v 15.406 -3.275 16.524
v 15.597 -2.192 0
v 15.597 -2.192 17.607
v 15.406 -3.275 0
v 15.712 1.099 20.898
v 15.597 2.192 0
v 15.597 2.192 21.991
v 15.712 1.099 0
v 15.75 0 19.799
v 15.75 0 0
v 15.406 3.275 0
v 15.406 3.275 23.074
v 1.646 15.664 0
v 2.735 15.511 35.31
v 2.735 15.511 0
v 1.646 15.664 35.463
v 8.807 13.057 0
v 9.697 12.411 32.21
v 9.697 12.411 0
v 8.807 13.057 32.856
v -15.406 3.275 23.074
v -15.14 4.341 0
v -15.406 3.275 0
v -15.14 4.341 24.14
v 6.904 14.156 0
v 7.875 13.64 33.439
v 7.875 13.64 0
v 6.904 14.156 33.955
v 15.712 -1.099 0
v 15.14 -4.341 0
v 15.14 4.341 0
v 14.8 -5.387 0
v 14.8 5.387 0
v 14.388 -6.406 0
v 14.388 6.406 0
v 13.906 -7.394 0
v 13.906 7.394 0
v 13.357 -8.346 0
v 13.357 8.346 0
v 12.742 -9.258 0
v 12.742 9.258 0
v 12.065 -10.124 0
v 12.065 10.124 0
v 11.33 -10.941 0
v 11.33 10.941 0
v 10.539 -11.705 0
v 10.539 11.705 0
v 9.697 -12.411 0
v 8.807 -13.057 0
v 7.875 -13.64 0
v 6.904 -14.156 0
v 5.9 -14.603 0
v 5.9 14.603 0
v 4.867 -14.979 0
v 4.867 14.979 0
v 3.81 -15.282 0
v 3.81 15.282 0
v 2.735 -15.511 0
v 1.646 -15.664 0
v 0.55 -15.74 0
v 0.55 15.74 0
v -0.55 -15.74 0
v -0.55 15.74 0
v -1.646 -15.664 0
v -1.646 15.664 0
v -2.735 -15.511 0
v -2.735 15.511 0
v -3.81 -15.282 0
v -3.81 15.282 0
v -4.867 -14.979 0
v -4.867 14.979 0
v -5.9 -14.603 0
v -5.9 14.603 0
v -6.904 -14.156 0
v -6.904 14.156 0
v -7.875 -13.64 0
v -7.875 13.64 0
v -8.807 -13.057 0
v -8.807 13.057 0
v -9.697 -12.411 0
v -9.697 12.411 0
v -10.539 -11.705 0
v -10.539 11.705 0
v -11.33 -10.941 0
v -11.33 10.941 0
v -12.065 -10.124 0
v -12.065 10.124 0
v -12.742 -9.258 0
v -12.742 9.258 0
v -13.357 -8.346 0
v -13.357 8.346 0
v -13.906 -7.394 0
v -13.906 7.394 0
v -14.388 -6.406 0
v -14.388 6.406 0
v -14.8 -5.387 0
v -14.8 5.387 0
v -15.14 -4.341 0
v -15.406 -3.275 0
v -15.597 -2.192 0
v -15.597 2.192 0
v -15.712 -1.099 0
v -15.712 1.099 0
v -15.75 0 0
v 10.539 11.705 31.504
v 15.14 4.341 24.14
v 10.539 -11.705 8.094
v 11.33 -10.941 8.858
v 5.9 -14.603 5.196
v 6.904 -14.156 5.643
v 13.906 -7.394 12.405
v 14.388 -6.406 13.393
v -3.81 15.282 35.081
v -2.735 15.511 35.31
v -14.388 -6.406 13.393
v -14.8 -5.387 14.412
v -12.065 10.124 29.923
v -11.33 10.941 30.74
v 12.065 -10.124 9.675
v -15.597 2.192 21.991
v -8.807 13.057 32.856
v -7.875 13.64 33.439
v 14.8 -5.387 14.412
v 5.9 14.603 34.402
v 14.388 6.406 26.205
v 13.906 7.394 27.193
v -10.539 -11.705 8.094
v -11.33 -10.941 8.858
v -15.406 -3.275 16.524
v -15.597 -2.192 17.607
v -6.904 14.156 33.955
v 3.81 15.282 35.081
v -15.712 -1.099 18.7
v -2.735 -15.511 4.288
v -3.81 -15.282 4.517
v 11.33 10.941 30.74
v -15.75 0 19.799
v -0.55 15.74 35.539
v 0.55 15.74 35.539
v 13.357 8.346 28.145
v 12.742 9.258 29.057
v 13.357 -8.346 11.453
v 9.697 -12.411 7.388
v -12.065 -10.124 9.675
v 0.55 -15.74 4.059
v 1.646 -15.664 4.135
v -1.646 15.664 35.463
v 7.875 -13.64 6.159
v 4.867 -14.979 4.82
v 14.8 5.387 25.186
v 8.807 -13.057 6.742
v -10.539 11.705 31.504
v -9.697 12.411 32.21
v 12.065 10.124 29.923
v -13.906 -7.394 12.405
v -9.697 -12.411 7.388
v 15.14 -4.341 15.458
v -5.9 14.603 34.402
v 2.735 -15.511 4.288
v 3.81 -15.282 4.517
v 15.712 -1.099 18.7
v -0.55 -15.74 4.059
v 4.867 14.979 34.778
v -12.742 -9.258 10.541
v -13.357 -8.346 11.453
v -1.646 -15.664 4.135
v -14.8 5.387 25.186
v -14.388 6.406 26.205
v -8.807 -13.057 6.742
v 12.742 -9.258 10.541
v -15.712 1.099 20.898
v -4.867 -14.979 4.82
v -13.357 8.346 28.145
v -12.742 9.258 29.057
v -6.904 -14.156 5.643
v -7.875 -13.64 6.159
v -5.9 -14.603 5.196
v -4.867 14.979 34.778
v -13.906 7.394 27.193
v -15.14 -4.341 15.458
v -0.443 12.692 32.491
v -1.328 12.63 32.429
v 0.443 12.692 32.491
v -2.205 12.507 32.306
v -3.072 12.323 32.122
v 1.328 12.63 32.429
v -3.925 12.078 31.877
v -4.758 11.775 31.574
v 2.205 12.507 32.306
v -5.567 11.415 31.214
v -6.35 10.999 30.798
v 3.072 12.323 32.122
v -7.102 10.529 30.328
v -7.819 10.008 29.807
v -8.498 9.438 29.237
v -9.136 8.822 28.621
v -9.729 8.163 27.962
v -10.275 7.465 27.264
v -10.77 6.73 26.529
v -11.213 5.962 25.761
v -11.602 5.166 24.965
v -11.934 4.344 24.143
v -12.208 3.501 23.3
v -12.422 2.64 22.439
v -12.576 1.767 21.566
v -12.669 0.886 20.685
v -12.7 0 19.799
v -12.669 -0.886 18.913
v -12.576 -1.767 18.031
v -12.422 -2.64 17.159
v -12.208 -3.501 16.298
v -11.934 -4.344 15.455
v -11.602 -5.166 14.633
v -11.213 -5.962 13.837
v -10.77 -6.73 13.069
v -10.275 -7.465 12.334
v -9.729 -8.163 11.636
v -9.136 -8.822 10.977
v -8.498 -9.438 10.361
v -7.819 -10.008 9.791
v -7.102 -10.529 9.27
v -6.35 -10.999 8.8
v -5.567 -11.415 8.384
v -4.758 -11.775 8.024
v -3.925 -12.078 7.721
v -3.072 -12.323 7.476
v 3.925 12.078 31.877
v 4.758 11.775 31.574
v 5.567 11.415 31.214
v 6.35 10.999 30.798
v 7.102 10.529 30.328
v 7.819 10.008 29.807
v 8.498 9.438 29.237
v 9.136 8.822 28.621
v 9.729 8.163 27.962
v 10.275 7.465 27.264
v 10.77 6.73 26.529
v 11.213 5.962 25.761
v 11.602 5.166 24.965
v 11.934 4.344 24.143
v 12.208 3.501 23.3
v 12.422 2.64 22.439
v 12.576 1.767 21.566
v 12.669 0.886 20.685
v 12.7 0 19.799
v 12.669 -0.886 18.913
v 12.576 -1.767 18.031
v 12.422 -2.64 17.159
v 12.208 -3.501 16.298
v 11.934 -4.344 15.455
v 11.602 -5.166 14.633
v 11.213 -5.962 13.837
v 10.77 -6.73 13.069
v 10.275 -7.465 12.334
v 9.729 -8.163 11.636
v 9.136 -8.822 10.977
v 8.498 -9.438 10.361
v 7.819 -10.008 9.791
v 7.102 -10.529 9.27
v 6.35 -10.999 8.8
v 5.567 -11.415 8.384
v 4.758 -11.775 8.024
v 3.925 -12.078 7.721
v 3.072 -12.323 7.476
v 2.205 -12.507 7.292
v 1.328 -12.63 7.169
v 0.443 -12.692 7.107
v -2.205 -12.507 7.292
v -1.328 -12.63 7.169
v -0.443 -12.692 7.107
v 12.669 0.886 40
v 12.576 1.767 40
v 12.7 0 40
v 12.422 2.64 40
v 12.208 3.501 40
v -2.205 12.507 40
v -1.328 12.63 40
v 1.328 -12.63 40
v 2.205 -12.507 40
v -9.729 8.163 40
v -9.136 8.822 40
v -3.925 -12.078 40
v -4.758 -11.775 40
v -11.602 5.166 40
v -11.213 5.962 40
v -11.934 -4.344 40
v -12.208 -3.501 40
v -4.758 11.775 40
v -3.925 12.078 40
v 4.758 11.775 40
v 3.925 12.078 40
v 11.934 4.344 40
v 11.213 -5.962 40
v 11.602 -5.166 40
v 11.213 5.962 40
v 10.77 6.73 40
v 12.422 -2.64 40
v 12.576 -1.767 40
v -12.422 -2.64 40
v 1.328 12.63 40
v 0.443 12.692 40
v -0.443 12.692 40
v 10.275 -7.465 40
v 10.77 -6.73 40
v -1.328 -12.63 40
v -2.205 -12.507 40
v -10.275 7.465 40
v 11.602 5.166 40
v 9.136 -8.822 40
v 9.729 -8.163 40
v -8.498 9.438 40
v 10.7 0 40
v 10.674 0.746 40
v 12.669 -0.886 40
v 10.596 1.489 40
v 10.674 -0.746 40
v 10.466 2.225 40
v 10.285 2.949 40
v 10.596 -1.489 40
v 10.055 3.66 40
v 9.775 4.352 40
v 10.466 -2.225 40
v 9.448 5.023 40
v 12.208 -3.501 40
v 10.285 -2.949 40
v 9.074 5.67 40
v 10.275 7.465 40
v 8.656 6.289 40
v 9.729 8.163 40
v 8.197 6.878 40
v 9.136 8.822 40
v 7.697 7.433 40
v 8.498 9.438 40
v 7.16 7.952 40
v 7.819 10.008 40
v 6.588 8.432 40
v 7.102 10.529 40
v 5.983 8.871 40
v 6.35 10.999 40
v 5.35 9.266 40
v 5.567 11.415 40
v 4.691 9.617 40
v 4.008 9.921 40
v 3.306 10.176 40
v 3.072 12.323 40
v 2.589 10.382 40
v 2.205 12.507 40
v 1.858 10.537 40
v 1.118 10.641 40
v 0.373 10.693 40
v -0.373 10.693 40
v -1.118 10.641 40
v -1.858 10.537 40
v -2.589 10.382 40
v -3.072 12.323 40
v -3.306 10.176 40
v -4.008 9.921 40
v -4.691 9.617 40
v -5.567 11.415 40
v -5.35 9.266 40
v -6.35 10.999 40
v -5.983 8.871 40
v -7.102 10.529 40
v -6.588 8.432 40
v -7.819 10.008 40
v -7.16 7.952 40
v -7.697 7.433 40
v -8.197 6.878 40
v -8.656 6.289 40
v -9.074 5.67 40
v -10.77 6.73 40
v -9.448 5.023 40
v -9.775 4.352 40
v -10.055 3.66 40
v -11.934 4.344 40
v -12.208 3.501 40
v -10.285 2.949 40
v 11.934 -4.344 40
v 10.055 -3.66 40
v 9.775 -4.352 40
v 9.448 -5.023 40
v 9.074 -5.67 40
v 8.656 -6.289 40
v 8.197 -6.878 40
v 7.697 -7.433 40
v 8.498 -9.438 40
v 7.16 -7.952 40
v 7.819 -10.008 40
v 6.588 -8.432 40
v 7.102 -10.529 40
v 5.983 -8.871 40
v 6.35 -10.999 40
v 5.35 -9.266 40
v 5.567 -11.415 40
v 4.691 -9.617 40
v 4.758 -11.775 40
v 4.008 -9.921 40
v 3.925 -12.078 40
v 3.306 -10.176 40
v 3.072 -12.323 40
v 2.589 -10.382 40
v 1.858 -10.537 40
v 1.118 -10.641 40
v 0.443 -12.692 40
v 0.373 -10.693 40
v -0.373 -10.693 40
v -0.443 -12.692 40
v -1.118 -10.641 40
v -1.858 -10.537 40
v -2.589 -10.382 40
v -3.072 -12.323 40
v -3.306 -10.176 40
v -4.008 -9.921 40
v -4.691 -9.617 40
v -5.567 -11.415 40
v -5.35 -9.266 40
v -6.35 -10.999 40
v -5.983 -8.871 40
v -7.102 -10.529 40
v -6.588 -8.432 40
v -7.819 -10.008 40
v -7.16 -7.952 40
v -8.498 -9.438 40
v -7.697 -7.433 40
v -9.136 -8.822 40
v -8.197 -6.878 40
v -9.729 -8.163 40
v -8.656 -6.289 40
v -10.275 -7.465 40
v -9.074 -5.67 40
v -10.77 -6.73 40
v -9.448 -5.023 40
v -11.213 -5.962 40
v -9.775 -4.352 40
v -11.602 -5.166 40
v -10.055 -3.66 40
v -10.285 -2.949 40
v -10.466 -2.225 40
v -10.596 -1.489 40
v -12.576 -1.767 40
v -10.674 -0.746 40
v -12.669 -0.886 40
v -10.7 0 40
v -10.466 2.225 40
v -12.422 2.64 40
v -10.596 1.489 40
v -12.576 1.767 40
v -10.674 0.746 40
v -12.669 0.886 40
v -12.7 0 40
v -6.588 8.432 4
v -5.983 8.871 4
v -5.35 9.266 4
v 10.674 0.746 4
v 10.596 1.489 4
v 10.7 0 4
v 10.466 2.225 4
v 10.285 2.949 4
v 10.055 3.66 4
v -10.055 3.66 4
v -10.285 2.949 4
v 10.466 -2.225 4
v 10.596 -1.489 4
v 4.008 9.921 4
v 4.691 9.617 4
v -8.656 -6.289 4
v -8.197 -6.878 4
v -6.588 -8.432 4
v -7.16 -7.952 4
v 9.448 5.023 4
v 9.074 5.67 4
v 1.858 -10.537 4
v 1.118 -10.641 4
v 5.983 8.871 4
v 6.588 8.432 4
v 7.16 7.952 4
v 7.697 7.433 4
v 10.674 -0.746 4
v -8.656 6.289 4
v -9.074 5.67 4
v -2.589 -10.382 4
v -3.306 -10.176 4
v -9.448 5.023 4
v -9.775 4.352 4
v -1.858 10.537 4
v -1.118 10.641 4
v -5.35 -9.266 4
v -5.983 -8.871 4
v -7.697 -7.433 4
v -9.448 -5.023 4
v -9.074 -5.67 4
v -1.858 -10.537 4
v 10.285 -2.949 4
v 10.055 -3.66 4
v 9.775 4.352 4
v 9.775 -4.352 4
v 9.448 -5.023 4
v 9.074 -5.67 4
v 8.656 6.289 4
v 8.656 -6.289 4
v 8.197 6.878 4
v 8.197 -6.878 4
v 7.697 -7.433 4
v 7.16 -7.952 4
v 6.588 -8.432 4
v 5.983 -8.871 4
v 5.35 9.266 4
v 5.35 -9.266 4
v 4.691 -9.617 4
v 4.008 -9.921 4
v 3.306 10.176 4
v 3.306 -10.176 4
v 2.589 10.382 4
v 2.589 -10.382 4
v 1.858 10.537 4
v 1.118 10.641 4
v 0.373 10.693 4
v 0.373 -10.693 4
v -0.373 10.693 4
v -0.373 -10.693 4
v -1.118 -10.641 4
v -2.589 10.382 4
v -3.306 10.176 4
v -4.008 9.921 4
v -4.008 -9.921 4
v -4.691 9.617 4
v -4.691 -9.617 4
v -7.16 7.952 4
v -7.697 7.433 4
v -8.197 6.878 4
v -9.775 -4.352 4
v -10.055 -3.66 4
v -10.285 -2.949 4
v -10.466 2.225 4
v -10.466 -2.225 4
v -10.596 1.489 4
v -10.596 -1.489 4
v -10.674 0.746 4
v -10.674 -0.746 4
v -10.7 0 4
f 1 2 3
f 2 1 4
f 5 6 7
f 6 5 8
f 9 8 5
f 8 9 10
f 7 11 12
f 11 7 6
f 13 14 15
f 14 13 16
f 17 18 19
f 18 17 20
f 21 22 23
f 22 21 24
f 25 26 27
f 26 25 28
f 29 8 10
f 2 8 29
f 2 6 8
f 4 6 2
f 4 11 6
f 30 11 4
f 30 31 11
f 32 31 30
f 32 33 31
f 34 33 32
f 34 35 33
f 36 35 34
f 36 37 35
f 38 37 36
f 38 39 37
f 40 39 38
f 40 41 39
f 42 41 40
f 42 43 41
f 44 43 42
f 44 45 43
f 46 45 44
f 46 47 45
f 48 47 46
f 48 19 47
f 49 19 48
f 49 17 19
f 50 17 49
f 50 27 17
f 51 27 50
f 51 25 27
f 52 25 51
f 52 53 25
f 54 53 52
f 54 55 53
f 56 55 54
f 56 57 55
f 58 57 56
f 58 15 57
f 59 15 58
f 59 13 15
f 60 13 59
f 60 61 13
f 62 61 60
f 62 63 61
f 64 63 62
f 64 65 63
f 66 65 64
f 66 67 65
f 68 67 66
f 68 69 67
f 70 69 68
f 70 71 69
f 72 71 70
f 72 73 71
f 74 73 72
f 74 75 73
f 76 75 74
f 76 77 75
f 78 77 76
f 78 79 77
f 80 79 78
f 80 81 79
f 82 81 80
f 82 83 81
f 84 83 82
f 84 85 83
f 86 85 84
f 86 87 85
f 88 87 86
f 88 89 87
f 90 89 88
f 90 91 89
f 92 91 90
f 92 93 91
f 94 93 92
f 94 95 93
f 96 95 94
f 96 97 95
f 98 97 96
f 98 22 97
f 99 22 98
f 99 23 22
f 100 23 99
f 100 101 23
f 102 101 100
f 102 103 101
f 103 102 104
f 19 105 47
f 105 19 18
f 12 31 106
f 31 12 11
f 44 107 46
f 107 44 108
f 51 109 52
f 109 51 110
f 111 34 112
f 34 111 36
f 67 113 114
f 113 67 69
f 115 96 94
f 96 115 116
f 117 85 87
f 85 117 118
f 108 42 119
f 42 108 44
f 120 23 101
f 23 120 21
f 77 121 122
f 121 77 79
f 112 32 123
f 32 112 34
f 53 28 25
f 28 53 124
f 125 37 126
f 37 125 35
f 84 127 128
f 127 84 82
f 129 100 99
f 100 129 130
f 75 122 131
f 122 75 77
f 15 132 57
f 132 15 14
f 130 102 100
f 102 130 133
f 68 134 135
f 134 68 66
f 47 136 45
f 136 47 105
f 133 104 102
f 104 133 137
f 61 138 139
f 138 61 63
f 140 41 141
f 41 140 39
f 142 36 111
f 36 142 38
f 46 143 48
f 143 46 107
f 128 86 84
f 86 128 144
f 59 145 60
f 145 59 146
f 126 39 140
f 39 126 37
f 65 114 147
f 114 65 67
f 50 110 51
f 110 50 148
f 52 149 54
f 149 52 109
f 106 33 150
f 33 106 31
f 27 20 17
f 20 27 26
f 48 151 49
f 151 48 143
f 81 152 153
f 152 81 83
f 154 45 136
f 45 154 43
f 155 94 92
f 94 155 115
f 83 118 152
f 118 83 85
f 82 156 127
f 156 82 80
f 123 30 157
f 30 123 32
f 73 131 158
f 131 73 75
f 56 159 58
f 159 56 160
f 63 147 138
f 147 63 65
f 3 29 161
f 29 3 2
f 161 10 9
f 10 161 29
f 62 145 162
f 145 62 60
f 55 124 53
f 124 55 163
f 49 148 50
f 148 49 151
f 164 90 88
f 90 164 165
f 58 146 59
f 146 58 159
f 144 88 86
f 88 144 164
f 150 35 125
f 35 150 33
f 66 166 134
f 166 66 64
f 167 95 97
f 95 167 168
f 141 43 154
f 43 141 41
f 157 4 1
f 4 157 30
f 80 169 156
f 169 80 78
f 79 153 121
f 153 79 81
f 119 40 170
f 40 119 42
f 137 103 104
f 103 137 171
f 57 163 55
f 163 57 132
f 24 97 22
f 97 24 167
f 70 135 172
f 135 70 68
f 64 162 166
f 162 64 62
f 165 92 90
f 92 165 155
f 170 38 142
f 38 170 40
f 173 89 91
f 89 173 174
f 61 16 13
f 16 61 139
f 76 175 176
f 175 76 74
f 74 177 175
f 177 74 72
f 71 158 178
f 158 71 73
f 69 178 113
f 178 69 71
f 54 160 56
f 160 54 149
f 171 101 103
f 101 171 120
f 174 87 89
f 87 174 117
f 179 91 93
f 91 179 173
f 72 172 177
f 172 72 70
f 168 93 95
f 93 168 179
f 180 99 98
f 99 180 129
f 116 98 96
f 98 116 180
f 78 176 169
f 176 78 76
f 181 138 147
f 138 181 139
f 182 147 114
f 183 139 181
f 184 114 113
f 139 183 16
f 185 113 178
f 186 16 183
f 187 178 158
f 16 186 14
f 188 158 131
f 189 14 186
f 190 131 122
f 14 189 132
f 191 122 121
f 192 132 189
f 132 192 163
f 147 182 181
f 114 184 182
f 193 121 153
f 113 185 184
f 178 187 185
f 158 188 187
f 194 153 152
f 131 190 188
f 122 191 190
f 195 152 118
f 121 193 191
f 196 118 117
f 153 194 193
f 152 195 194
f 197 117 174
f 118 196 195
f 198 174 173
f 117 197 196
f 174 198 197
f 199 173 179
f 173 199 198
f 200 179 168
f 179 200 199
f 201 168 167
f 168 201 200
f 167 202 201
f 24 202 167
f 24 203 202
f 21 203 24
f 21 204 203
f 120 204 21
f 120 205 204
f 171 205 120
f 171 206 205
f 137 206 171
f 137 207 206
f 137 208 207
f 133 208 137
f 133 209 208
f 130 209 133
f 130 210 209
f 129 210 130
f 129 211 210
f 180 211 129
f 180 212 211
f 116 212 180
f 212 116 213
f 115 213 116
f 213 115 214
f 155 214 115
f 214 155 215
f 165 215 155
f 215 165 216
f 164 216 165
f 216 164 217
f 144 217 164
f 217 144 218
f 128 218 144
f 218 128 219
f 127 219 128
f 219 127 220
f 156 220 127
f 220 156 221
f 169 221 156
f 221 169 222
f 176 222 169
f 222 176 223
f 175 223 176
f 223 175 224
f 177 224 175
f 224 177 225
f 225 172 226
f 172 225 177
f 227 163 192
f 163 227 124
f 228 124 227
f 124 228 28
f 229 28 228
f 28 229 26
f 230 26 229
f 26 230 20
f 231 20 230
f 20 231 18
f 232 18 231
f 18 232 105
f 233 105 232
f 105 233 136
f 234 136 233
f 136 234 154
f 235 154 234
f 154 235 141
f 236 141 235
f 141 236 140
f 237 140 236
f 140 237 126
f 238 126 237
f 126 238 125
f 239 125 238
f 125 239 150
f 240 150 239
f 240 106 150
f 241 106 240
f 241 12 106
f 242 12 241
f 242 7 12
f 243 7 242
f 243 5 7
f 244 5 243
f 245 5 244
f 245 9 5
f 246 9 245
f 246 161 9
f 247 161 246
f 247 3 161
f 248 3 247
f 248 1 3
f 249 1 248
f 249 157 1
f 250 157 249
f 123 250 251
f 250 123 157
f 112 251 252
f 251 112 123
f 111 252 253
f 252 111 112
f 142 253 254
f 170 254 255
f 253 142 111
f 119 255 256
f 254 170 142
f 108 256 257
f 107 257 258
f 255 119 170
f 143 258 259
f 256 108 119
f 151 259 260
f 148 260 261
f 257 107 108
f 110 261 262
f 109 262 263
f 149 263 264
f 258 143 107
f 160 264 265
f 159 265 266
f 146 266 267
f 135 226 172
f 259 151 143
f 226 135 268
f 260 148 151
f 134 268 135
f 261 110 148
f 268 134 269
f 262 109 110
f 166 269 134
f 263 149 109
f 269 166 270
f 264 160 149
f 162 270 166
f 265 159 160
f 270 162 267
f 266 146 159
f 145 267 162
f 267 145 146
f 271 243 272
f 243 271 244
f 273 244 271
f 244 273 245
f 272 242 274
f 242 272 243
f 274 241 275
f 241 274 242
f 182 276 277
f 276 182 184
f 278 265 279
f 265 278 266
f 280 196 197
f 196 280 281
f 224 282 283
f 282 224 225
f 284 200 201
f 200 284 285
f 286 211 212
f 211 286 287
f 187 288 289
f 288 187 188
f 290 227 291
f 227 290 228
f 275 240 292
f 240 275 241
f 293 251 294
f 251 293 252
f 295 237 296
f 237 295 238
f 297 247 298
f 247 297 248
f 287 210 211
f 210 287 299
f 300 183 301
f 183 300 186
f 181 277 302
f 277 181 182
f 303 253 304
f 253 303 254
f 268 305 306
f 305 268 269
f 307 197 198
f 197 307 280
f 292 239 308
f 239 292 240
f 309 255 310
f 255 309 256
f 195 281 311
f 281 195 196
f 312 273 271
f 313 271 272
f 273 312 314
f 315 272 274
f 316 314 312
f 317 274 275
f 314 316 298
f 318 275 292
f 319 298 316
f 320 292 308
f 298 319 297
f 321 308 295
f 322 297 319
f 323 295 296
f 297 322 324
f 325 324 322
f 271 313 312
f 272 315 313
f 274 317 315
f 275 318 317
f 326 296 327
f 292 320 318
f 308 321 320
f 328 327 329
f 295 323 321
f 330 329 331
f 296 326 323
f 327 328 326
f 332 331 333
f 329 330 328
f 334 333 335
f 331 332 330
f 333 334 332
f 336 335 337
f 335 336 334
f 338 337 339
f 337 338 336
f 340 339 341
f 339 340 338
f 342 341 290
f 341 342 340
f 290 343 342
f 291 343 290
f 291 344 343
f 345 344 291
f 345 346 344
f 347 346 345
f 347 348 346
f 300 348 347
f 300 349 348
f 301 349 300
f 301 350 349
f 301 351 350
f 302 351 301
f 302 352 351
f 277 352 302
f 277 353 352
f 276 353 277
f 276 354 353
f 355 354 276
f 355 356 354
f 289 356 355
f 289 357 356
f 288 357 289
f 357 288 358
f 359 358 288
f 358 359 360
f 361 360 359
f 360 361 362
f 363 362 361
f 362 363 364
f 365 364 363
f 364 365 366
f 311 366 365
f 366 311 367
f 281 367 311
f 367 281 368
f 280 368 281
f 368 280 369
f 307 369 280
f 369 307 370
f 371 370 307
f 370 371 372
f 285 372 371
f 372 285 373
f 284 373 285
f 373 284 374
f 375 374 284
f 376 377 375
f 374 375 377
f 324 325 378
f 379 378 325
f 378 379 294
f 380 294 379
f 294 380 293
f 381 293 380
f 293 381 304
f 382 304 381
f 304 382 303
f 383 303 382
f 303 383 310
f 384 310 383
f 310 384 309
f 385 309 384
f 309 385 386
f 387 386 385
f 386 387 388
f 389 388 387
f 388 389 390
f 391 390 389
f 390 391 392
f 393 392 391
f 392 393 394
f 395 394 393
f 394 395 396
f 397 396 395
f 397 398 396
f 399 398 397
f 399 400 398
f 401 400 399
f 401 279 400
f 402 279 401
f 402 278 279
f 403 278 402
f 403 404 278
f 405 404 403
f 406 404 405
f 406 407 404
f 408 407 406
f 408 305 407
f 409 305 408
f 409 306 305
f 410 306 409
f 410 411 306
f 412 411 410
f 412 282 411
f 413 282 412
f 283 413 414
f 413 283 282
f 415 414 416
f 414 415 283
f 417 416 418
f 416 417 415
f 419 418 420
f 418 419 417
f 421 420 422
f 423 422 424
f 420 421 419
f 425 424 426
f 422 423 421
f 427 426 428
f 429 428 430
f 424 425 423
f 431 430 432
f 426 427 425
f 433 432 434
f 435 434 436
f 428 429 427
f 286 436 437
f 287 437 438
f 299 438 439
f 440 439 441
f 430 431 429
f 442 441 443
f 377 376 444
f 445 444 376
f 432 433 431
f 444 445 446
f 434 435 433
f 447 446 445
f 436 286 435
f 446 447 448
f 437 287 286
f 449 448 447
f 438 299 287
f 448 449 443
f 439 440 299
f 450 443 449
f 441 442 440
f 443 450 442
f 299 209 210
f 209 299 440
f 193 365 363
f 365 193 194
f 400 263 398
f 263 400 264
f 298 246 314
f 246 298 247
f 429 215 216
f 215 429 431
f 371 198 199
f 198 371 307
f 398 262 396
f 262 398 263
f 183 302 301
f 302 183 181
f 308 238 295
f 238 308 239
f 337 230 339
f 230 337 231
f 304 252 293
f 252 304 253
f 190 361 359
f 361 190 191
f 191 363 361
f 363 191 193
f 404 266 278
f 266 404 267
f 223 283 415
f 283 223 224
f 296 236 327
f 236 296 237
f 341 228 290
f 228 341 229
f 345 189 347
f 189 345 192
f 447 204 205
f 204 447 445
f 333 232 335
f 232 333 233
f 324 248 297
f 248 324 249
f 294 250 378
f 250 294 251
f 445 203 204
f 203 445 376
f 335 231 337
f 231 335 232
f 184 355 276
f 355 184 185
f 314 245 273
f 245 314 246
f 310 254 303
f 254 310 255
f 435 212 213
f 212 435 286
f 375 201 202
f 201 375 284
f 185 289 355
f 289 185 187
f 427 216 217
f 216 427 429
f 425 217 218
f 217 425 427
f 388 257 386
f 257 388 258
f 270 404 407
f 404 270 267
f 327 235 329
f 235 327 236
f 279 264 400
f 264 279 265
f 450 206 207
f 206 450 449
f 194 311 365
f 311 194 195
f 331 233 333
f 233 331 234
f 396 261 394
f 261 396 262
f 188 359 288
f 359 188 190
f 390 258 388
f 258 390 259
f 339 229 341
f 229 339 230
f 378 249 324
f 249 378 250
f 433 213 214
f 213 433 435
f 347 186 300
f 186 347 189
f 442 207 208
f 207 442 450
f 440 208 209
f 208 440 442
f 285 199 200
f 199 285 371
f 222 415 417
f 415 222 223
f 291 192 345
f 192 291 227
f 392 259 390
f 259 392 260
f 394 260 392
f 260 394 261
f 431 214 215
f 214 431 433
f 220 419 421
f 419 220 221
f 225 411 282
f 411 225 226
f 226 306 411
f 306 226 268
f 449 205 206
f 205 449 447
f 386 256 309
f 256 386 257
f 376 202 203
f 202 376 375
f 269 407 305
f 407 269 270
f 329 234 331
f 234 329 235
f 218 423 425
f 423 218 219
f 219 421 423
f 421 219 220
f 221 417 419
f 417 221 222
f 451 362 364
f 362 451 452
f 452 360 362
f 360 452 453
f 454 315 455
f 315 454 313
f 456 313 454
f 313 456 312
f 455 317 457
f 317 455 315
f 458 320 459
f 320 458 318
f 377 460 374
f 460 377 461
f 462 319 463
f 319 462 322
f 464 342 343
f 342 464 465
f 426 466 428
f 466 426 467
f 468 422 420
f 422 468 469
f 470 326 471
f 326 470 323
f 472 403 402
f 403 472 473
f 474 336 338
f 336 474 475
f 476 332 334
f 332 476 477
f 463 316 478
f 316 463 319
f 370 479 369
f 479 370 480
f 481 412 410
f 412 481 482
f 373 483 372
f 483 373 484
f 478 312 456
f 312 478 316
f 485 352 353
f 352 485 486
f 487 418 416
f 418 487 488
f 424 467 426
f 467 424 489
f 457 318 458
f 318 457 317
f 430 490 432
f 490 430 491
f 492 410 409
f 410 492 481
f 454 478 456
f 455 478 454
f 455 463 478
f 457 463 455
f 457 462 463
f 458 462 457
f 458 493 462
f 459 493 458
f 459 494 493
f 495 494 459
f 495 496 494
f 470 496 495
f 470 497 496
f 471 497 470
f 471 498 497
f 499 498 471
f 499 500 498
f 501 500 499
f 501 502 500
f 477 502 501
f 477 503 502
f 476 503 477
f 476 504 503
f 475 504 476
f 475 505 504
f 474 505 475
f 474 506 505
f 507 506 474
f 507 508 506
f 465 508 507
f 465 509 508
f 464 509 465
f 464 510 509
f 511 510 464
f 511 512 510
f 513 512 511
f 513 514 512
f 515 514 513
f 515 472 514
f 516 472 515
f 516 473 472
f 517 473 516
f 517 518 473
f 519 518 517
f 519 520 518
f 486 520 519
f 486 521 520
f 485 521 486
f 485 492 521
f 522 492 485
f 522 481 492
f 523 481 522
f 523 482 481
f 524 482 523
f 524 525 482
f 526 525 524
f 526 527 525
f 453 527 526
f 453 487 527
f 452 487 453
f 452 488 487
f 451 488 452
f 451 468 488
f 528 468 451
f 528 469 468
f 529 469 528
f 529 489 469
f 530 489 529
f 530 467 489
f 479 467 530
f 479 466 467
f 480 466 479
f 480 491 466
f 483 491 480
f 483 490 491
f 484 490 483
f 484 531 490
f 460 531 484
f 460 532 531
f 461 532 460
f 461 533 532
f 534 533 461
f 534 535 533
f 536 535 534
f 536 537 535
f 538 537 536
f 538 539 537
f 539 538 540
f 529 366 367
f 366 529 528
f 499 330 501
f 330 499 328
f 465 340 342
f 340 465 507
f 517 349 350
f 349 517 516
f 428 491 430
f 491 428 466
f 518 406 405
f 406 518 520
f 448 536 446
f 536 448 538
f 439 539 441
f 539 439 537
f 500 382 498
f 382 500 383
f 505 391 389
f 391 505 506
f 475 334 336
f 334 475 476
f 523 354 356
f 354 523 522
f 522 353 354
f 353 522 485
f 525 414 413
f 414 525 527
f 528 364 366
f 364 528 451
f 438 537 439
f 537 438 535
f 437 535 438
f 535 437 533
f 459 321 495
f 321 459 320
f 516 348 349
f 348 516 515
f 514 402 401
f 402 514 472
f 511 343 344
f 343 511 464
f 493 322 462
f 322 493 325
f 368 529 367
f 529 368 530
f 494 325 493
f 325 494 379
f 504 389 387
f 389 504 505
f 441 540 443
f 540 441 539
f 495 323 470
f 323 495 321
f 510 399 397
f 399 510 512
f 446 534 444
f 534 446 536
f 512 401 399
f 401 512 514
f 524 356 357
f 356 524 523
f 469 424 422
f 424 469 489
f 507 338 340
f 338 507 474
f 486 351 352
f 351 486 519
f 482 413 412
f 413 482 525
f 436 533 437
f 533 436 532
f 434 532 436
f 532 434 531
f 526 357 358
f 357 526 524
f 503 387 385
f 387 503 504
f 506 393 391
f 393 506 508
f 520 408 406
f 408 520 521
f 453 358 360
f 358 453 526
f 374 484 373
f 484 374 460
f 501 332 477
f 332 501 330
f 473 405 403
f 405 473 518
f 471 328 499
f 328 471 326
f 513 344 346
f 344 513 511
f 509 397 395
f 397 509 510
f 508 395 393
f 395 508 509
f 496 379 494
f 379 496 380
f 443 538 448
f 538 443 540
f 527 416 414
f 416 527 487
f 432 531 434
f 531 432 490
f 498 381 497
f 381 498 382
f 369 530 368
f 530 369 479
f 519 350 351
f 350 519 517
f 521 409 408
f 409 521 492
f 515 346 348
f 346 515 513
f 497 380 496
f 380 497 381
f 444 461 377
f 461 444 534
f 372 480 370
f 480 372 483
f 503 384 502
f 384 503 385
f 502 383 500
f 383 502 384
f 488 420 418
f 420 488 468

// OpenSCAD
$fn = 90;

D_OUTER = 31.5;
D_INNER = 25.4;

difference() {
    union() {
        cylinder(d=D_INNER, h=40);
        difference() 
        {
            cylinder(d=D_OUTER, h=40); 
            rotate([45, 0, 0]) {
                translate([-40, -40, 14]) {
                    cube(size=[80, 80, 40]);
                }
            }
        }
    }
    translate([0, 0, 4]) cylinder(d=D_INNER-4, h=40);
}
